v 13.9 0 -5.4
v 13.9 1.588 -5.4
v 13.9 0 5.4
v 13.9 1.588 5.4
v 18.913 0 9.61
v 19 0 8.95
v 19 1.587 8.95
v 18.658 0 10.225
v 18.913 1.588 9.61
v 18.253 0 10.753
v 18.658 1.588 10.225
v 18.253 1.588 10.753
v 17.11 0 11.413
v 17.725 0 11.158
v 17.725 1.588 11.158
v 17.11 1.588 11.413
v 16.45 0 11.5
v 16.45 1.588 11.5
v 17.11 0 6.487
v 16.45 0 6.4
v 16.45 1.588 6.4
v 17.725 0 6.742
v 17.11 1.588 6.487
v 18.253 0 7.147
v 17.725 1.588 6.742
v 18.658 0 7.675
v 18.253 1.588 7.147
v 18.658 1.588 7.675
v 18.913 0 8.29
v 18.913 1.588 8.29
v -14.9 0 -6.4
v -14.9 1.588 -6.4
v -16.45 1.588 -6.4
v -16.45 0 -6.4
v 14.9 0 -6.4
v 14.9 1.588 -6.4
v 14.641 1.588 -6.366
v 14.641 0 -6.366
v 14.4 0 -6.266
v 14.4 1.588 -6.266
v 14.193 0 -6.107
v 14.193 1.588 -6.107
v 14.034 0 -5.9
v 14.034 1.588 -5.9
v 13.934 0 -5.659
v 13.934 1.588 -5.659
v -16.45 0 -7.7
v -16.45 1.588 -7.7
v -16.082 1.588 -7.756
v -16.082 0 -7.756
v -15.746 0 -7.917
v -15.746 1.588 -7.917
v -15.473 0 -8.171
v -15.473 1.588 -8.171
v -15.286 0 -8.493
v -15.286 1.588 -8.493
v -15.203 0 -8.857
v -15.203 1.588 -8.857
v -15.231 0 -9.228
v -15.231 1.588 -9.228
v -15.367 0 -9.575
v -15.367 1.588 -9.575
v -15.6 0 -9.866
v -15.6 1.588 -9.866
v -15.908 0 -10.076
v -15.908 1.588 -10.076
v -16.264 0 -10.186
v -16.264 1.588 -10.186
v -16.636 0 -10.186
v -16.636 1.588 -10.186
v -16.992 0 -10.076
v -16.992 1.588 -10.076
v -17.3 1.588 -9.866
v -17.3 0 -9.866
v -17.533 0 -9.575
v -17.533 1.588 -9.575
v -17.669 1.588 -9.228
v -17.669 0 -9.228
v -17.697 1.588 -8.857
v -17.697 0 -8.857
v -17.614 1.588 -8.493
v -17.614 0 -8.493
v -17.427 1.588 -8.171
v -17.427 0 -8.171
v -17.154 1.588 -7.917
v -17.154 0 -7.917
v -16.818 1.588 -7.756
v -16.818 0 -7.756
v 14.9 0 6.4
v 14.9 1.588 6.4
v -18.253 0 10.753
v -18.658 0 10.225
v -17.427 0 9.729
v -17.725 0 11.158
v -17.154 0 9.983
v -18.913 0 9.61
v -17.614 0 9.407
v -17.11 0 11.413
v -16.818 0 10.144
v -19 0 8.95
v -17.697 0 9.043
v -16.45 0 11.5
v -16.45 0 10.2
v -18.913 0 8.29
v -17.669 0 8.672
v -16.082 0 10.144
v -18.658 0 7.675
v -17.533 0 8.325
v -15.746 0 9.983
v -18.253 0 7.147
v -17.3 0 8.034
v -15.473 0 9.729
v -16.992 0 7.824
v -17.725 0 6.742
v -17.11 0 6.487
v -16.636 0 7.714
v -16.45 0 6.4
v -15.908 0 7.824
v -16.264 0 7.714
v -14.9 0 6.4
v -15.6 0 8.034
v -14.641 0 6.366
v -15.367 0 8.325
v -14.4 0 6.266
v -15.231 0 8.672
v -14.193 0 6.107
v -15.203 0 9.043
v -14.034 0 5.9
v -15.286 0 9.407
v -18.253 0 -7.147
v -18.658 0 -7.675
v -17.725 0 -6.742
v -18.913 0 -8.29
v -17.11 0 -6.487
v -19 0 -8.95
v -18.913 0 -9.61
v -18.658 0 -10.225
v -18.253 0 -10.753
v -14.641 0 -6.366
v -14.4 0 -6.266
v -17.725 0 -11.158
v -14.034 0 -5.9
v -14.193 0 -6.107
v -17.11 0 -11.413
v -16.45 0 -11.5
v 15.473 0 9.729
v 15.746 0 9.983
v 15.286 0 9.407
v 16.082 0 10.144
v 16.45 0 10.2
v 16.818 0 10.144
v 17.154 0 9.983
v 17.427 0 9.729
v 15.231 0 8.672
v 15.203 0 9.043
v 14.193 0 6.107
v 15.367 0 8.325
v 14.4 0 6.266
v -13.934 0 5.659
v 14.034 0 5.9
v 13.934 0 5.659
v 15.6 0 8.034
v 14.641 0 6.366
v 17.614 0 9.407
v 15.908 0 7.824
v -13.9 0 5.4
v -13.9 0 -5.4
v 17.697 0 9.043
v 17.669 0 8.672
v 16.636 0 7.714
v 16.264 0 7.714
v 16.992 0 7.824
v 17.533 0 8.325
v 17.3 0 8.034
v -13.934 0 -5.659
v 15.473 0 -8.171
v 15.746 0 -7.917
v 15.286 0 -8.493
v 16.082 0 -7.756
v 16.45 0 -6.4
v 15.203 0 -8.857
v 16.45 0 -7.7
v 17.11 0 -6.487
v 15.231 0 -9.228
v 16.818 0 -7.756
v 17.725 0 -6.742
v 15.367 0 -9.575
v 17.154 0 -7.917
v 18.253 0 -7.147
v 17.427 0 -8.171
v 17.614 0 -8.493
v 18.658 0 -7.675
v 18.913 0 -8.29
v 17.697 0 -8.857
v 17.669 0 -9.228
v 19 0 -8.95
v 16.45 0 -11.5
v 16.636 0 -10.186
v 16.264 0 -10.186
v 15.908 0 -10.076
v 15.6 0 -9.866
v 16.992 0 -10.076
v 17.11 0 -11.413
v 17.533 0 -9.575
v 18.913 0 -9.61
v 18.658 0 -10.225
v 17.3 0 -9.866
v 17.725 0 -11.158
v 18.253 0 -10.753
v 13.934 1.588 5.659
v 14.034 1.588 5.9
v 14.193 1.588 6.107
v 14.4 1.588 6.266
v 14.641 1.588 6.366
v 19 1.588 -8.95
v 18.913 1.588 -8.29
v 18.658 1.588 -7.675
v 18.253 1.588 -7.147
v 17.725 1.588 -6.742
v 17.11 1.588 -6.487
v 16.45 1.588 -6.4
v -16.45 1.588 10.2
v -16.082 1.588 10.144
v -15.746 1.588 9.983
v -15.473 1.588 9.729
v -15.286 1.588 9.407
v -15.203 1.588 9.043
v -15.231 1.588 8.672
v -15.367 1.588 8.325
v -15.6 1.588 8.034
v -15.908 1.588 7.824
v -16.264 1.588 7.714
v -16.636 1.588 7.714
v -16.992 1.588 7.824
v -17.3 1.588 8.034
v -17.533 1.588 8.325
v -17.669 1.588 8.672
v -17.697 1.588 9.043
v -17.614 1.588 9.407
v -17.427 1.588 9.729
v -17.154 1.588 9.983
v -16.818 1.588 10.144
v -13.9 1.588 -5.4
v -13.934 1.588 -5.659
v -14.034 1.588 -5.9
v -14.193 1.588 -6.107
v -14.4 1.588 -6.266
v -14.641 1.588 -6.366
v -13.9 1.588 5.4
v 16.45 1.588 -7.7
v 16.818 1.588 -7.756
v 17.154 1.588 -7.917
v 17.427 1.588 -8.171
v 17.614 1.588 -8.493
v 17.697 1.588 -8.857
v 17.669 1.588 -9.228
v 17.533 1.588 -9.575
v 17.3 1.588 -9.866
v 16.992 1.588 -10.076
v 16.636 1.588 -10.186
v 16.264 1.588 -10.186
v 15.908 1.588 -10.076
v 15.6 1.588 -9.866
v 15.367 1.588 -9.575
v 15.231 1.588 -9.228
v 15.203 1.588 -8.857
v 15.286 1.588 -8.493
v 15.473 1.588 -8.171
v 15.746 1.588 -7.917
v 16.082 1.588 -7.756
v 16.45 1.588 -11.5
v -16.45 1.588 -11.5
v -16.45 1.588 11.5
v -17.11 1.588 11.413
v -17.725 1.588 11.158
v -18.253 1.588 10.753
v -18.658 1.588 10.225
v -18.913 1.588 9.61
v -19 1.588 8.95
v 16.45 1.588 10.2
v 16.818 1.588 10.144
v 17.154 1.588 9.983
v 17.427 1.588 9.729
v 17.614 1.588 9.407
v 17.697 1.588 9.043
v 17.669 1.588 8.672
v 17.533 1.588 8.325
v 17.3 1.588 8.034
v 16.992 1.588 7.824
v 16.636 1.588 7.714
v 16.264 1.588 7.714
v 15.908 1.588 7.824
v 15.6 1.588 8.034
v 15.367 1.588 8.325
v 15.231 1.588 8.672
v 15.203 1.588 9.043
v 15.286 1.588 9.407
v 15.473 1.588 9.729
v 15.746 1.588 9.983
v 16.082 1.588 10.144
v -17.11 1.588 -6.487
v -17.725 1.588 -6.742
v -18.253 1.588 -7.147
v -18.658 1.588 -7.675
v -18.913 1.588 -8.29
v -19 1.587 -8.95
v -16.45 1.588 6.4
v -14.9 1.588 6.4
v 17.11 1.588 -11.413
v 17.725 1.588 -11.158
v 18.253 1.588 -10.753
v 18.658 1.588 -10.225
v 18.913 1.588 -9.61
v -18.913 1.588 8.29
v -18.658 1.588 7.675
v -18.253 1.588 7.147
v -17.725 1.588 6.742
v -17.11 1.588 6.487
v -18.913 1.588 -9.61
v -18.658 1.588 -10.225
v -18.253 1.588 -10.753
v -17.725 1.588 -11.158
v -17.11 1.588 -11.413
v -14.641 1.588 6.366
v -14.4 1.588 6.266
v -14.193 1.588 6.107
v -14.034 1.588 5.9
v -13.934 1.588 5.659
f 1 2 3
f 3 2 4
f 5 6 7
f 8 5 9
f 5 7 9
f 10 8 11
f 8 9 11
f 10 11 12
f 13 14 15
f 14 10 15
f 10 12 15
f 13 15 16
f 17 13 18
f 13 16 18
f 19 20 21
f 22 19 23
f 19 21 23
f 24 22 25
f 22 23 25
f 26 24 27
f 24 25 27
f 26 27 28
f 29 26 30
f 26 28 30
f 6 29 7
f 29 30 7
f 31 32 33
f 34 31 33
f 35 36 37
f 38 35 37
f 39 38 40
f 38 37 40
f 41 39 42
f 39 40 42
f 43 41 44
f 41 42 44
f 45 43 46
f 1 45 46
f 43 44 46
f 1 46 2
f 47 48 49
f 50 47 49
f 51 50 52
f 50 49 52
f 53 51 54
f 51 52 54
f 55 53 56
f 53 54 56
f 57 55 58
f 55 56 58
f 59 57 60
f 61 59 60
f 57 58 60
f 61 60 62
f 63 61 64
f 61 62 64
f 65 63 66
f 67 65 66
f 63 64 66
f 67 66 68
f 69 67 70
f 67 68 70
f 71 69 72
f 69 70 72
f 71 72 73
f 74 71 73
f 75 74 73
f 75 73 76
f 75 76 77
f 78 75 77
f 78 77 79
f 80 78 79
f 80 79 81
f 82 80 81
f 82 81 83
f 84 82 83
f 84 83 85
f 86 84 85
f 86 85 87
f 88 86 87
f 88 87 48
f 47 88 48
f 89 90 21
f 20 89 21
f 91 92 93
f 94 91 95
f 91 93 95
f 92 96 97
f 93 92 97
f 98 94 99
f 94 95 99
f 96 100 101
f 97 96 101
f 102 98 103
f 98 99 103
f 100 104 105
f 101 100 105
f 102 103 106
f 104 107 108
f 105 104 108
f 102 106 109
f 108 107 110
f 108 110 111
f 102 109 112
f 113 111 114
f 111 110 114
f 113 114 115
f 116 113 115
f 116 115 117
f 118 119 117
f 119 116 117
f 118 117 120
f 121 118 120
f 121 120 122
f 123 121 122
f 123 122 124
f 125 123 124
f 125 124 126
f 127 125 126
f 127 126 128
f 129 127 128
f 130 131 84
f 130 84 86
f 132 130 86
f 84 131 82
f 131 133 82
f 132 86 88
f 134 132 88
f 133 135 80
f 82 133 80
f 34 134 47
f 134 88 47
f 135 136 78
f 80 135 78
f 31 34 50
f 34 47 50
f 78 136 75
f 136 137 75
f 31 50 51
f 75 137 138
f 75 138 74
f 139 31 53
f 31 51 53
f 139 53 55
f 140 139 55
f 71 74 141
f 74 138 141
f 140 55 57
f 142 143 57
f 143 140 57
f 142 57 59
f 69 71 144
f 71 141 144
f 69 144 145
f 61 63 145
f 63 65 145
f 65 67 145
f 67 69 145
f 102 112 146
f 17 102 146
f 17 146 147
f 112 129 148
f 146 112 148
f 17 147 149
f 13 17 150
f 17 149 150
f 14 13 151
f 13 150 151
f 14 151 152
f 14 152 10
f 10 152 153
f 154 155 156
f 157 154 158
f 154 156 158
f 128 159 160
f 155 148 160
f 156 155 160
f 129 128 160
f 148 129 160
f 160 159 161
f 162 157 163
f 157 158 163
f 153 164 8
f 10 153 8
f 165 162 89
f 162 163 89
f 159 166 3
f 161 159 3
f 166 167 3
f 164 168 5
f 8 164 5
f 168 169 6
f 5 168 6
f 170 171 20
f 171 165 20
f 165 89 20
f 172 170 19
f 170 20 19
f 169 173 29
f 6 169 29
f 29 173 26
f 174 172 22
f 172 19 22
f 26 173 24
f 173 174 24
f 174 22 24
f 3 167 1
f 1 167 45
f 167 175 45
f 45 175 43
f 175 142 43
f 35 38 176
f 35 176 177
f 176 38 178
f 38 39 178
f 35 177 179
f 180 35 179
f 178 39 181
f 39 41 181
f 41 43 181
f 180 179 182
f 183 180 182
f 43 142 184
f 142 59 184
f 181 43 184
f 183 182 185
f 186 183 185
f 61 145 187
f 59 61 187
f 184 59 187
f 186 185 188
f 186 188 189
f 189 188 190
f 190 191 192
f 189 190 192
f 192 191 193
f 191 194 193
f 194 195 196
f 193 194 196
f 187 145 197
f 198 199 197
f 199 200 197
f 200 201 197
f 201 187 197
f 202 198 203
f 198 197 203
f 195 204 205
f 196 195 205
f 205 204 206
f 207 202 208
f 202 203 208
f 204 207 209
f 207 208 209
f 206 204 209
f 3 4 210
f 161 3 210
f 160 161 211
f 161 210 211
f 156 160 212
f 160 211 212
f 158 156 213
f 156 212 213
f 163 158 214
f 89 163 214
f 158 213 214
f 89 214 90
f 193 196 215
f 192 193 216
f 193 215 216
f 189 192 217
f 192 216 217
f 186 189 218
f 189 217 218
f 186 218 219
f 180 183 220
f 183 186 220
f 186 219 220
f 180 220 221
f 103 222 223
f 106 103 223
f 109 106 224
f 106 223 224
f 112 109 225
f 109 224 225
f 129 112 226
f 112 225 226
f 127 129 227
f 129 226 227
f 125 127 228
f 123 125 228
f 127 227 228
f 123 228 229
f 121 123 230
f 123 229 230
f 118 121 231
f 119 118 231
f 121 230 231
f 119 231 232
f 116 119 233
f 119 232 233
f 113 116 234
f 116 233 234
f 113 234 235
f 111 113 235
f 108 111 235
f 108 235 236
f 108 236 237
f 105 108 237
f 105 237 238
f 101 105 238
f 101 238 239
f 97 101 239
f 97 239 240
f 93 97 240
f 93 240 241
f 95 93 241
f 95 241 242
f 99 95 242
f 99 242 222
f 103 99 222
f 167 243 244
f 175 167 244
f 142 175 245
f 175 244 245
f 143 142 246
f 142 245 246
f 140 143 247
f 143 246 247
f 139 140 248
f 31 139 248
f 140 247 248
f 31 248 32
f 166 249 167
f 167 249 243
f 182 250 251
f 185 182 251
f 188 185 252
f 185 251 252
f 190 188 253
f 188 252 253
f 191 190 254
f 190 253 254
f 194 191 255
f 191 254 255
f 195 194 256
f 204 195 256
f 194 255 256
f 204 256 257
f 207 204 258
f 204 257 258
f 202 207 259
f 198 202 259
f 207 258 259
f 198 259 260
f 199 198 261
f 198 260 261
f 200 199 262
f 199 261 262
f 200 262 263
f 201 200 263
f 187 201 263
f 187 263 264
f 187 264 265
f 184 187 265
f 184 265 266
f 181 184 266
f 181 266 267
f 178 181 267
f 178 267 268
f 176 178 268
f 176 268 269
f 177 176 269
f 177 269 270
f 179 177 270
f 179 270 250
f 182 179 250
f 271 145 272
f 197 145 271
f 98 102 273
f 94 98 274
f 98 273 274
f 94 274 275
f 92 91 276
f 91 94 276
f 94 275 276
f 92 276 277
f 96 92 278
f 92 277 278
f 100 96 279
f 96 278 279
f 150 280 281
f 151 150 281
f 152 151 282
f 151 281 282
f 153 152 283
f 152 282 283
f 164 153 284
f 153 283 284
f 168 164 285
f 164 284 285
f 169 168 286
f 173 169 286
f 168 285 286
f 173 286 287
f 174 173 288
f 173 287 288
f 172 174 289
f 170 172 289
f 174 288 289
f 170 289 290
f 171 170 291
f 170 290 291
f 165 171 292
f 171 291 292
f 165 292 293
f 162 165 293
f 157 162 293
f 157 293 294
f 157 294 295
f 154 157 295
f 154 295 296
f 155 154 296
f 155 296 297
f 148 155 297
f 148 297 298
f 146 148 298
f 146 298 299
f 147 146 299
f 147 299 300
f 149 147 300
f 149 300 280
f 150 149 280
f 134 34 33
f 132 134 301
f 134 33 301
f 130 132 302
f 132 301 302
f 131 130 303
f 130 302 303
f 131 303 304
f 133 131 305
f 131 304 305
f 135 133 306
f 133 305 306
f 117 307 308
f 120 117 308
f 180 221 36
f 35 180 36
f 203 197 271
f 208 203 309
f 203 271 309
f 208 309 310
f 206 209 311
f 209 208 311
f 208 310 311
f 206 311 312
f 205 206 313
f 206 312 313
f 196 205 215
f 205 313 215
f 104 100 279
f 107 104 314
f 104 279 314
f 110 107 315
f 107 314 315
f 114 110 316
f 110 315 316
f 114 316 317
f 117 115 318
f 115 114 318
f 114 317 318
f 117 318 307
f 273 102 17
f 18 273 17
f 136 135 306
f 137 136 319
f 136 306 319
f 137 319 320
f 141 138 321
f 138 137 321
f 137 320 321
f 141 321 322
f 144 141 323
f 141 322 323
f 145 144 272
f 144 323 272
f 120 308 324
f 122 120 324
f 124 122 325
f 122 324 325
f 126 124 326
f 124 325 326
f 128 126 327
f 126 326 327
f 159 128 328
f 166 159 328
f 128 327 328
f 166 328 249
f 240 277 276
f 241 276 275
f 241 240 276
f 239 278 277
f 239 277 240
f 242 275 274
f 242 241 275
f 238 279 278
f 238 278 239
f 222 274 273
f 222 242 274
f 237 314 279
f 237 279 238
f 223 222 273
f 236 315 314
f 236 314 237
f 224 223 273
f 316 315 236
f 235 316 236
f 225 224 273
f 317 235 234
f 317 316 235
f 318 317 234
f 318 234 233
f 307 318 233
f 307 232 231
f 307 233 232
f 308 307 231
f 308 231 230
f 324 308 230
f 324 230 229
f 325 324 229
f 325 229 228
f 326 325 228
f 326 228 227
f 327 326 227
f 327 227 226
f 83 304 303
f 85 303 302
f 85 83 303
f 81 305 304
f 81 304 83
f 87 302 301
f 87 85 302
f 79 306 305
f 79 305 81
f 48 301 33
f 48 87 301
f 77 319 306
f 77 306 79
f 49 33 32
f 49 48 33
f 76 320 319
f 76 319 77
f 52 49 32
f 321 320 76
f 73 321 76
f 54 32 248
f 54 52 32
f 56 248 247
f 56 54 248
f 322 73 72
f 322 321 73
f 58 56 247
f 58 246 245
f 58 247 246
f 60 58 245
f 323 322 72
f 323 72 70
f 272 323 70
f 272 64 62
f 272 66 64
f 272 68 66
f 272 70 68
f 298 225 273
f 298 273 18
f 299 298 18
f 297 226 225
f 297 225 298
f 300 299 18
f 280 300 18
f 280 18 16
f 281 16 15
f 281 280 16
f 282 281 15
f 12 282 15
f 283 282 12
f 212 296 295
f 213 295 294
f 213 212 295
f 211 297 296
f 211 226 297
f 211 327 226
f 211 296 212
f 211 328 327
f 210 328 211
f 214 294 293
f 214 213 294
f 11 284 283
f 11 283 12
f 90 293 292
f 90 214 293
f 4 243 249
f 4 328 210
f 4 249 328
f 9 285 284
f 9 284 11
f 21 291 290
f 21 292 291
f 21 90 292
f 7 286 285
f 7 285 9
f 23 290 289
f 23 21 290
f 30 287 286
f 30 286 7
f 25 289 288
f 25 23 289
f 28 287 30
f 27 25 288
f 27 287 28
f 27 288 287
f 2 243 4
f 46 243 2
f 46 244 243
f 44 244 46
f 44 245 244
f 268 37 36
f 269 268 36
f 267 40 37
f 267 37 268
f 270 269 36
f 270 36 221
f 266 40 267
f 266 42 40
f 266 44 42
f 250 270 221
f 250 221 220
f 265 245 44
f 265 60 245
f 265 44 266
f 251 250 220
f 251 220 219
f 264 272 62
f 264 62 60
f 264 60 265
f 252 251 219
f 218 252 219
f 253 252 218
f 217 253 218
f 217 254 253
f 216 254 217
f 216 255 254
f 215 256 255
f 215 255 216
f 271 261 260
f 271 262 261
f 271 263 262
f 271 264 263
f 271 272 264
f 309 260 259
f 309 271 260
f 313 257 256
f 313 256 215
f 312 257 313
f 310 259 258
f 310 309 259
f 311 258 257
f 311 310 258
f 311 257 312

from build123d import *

# Parameters (mm, degrees)
SKETCH1_W           = 38
SKETCH1_H           = 23
BOSS_EXTRUDE1_DEPTH = 1.5875
CUT_EXTRUDE1_REACH  = 24.266
SKETCH2_R           = 1.25


with BuildPart() as part:
    # Sketch1 → Boss-Extrude1 (new body)
    with BuildSketch(Plane(origin=(0, 0, 0), x_dir=(1, 0, 0), z_dir=(0, 1, 0))):
        Rectangle(SKETCH1_W, SKETCH1_H)
    extrude(amount=BOSS_EXTRUDE1_DEPTH)

    # Sketch2 → Cut-Extrude1 (cut, up to next)
    with BuildSketch(Plane(origin=(0, 1.5875, 0), x_dir=(1, 0, 0), z_dir=(0, 1, 0)), mode=Mode.PRIVATE) as cut_extrude1_sk1:
        with BuildLine():
            Line((-19, 11.5), (-19, 8.95))
            ThreePointArc((-19, 8.95), (-18.253122292, 10.753122292), (-16.45, 11.5))
            Line((-16.45, 11.5), (-19, 11.5))
        make_face()
    cut_extrude1_tool1 = extrude(cut_extrude1_sk1.sketch, amount=-CUT_EXTRUDE1_REACH, mode=Mode.PRIVATE) & part.part
    # Sketch2 → Cut-Extrude1 (cut, up to next)
    with BuildSketch(Plane(origin=(0, 1.5875, 0), x_dir=(1, 0, 0), z_dir=(0, 1, 0)), mode=Mode.PRIVATE) as cut_extrude1_sk2:
        with Locations(Location((-16.45, 8.95, 0), (0, 0, 270))):
            Circle(SKETCH2_R)
    cut_extrude1_tool2 = extrude(cut_extrude1_sk2.sketch, amount=-CUT_EXTRUDE1_REACH, mode=Mode.PRIVATE) & part.part
    # Sketch2 → Cut-Extrude1 (cut, up to next)
    with BuildSketch(Plane(origin=(0, 1.5875, 0), x_dir=(1, 0, 0), z_dir=(0, 1, 0)), mode=Mode.PRIVATE) as cut_extrude1_sk3:
        with BuildLine():
            Line((-14.9, 6.4), (-16.45, 6.4))
            ThreePointArc((-16.45, 6.4), (-18.253122292, 7.146877708), (-19, 8.95))
            Line((-19, 8.95), (-19, -8.95))
            ThreePointArc((-19, -8.95), (-18.253122292, -7.146877708), (-16.45, -6.4))
            Line((-16.45, -6.4), (-14.9, -6.4))
            ThreePointArc((-14.9, -6.4), (-14.192893219, -6.107106781), (-13.9, -5.4))
            Line((-13.9, -5.4), (-13.9, 5.4))
            ThreePointArc((-13.9, 5.4), (-14.192893219, 6.107106781), (-14.9, 6.4))
        make_face()
    cut_extrude1_tool3 = extrude(cut_extrude1_sk3.sketch, amount=-CUT_EXTRUDE1_REACH, mode=Mode.PRIVATE) & part.part
    # Sketch2 → Cut-Extrude1 (cut, up to next)
    with BuildSketch(Plane(origin=(0, 1.5875, 0), x_dir=(1, 0, 0), z_dir=(0, 1, 0)), mode=Mode.PRIVATE) as cut_extrude1_sk4:
        with BuildLine():
            ThreePointArc((-16.45, -11.5), (-18.253122292, -10.753122292), (-19, -8.95))
            Line((-19, -8.95), (-19, -11.5))
            Line((-19, -11.5), (-16.45, -11.5))
        make_face()
    cut_extrude1_tool4 = extrude(cut_extrude1_sk4.sketch, amount=-CUT_EXTRUDE1_REACH, mode=Mode.PRIVATE) & part.part
    # Sketch2 → Cut-Extrude1 (cut, up to next)
    with BuildSketch(Plane(origin=(0, 1.5875, 0), x_dir=(1, 0, 0), z_dir=(0, 1, 0)), mode=Mode.PRIVATE) as cut_extrude1_sk5:
        with Locations(Location((-16.45, -8.95, 0), (0, 0, 270))):
            Circle(SKETCH2_R)
    cut_extrude1_tool5 = extrude(cut_extrude1_sk5.sketch, amount=-CUT_EXTRUDE1_REACH, mode=Mode.PRIVATE) & part.part
    # Sketch2 → Cut-Extrude1 (cut, up to next)
    with BuildSketch(Plane(origin=(0, 1.5875, 0), x_dir=(1, 0, 0), z_dir=(0, 1, 0)), mode=Mode.PRIVATE) as cut_extrude1_sk6:
        with Locations(Location((16.45, -8.95, 0), (0, 0, 270))):
            Circle(SKETCH2_R)
    cut_extrude1_tool6 = extrude(cut_extrude1_sk6.sketch, amount=-CUT_EXTRUDE1_REACH, mode=Mode.PRIVATE) & part.part
    # Sketch2 → Cut-Extrude1 (cut, up to next)
    with BuildSketch(Plane(origin=(0, 1.5875, 0), x_dir=(1, 0, 0), z_dir=(0, 1, 0)), mode=Mode.PRIVATE) as cut_extrude1_sk7:
        with BuildLine():
            ThreePointArc((19, -8.95), (18.253122304, -10.75312228), (16.450000035, -11.5))
            Line((16.450000035, -11.5), (19, -11.5))
            Line((19, -11.5), (19, -8.95))
        make_face()
    cut_extrude1_tool7 = extrude(cut_extrude1_sk7.sketch, amount=-CUT_EXTRUDE1_REACH, mode=Mode.PRIVATE) & part.part
    # Sketch2 → Cut-Extrude1 (cut, up to next)
    with BuildSketch(Plane(origin=(0, 1.5875, 0), x_dir=(1, 0, 0), z_dir=(0, 1, 0)), mode=Mode.PRIVATE) as cut_extrude1_sk8:
        with BuildLine():
            Line((19, -8.95), (19, 8.95))
            ThreePointArc((19, 8.95), (18.253122292, 7.146877708), (16.45, 6.4))
            Line((16.45, 6.4), (14.9, 6.4))
            ThreePointArc((14.9, 6.4), (14.192893219, 6.107106781), (13.9, 5.4))
            Line((13.9, 5.4), (13.9, -5.4))
            ThreePointArc((13.9, -5.4), (14.192893219, -6.107106781), (14.9, -6.4))
            Line((14.9, -6.4), (16.45, -6.4))
            ThreePointArc((16.45, -6.4), (18.253122292, -7.146877708), (19, -8.95))
        make_face()
    cut_extrude1_tool8 = extrude(cut_extrude1_sk8.sketch, amount=-CUT_EXTRUDE1_REACH, mode=Mode.PRIVATE) & part.part
    # Sketch2 → Cut-Extrude1 (cut, up to next)
    with BuildSketch(Plane(origin=(0, 1.5875, 0), x_dir=(1, 0, 0), z_dir=(0, 1, 0)), mode=Mode.PRIVATE) as cut_extrude1_sk9:
        with BuildLine():
            Line((19, 11.5), (16.45, 11.5))
            ThreePointArc((16.45, 11.5), (18.253122292, 10.753122292), (19, 8.95))
            Line((19, 8.95), (19, 11.5))
        make_face()
    cut_extrude1_tool9 = extrude(cut_extrude1_sk9.sketch, amount=-CUT_EXTRUDE1_REACH, mode=Mode.PRIVATE) & part.part
    # Sketch2 → Cut-Extrude1 (cut, up to next)
    with BuildSketch(Plane(origin=(0, 1.5875, 0), x_dir=(1, 0, 0), z_dir=(0, 1, 0)), mode=Mode.PRIVATE) as cut_extrude1_sk10:
        with Locations(Location((16.45, 8.95, 0), (0, 0, 270))):
            Circle(SKETCH2_R)
    cut_extrude1_tool10 = extrude(cut_extrude1_sk10.sketch, amount=-CUT_EXTRUDE1_REACH, mode=Mode.PRIVATE) & part.part
    add(cut_extrude1_tool1.solids().sort_by_distance((-18.430412, 1.5875, -10.930412))[0], mode=Mode.SUBTRACT)
    add(cut_extrude1_tool2.solids().sort_by_distance((-16.45, 1.5875, -8.95))[0], mode=Mode.SUBTRACT)
    add(cut_extrude1_tool3.solids().sort_by_distance((-16.546475, 1.5875, 0))[0], mode=Mode.SUBTRACT)
    add(cut_extrude1_tool4.solids().sort_by_distance((-18.430412, 1.5875, 10.930412))[0], mode=Mode.SUBTRACT)
    add(cut_extrude1_tool5.solids().sort_by_distance((-16.45, 1.5875, 8.95))[0], mode=Mode.SUBTRACT)
    add(cut_extrude1_tool6.solids().sort_by_distance((16.45, 1.5875, 8.95))[0], mode=Mode.SUBTRACT)
    add(cut_extrude1_tool7.solids().sort_by_distance((18.430412, 1.5875, 10.930412))[0], mode=Mode.SUBTRACT)
    add(cut_extrude1_tool8.solids().sort_by_distance((16.546475, 1.5875, 0))[0], mode=Mode.SUBTRACT)
    add(cut_extrude1_tool9.solids().sort_by_distance((18.430412, 1.5875, -10.930412))[0], mode=Mode.SUBTRACT)
    add(cut_extrude1_tool10.solids().sort_by_distance((16.45, 1.5875, -8.95))[0], mode=Mode.SUBTRACT)


solid = part.part
